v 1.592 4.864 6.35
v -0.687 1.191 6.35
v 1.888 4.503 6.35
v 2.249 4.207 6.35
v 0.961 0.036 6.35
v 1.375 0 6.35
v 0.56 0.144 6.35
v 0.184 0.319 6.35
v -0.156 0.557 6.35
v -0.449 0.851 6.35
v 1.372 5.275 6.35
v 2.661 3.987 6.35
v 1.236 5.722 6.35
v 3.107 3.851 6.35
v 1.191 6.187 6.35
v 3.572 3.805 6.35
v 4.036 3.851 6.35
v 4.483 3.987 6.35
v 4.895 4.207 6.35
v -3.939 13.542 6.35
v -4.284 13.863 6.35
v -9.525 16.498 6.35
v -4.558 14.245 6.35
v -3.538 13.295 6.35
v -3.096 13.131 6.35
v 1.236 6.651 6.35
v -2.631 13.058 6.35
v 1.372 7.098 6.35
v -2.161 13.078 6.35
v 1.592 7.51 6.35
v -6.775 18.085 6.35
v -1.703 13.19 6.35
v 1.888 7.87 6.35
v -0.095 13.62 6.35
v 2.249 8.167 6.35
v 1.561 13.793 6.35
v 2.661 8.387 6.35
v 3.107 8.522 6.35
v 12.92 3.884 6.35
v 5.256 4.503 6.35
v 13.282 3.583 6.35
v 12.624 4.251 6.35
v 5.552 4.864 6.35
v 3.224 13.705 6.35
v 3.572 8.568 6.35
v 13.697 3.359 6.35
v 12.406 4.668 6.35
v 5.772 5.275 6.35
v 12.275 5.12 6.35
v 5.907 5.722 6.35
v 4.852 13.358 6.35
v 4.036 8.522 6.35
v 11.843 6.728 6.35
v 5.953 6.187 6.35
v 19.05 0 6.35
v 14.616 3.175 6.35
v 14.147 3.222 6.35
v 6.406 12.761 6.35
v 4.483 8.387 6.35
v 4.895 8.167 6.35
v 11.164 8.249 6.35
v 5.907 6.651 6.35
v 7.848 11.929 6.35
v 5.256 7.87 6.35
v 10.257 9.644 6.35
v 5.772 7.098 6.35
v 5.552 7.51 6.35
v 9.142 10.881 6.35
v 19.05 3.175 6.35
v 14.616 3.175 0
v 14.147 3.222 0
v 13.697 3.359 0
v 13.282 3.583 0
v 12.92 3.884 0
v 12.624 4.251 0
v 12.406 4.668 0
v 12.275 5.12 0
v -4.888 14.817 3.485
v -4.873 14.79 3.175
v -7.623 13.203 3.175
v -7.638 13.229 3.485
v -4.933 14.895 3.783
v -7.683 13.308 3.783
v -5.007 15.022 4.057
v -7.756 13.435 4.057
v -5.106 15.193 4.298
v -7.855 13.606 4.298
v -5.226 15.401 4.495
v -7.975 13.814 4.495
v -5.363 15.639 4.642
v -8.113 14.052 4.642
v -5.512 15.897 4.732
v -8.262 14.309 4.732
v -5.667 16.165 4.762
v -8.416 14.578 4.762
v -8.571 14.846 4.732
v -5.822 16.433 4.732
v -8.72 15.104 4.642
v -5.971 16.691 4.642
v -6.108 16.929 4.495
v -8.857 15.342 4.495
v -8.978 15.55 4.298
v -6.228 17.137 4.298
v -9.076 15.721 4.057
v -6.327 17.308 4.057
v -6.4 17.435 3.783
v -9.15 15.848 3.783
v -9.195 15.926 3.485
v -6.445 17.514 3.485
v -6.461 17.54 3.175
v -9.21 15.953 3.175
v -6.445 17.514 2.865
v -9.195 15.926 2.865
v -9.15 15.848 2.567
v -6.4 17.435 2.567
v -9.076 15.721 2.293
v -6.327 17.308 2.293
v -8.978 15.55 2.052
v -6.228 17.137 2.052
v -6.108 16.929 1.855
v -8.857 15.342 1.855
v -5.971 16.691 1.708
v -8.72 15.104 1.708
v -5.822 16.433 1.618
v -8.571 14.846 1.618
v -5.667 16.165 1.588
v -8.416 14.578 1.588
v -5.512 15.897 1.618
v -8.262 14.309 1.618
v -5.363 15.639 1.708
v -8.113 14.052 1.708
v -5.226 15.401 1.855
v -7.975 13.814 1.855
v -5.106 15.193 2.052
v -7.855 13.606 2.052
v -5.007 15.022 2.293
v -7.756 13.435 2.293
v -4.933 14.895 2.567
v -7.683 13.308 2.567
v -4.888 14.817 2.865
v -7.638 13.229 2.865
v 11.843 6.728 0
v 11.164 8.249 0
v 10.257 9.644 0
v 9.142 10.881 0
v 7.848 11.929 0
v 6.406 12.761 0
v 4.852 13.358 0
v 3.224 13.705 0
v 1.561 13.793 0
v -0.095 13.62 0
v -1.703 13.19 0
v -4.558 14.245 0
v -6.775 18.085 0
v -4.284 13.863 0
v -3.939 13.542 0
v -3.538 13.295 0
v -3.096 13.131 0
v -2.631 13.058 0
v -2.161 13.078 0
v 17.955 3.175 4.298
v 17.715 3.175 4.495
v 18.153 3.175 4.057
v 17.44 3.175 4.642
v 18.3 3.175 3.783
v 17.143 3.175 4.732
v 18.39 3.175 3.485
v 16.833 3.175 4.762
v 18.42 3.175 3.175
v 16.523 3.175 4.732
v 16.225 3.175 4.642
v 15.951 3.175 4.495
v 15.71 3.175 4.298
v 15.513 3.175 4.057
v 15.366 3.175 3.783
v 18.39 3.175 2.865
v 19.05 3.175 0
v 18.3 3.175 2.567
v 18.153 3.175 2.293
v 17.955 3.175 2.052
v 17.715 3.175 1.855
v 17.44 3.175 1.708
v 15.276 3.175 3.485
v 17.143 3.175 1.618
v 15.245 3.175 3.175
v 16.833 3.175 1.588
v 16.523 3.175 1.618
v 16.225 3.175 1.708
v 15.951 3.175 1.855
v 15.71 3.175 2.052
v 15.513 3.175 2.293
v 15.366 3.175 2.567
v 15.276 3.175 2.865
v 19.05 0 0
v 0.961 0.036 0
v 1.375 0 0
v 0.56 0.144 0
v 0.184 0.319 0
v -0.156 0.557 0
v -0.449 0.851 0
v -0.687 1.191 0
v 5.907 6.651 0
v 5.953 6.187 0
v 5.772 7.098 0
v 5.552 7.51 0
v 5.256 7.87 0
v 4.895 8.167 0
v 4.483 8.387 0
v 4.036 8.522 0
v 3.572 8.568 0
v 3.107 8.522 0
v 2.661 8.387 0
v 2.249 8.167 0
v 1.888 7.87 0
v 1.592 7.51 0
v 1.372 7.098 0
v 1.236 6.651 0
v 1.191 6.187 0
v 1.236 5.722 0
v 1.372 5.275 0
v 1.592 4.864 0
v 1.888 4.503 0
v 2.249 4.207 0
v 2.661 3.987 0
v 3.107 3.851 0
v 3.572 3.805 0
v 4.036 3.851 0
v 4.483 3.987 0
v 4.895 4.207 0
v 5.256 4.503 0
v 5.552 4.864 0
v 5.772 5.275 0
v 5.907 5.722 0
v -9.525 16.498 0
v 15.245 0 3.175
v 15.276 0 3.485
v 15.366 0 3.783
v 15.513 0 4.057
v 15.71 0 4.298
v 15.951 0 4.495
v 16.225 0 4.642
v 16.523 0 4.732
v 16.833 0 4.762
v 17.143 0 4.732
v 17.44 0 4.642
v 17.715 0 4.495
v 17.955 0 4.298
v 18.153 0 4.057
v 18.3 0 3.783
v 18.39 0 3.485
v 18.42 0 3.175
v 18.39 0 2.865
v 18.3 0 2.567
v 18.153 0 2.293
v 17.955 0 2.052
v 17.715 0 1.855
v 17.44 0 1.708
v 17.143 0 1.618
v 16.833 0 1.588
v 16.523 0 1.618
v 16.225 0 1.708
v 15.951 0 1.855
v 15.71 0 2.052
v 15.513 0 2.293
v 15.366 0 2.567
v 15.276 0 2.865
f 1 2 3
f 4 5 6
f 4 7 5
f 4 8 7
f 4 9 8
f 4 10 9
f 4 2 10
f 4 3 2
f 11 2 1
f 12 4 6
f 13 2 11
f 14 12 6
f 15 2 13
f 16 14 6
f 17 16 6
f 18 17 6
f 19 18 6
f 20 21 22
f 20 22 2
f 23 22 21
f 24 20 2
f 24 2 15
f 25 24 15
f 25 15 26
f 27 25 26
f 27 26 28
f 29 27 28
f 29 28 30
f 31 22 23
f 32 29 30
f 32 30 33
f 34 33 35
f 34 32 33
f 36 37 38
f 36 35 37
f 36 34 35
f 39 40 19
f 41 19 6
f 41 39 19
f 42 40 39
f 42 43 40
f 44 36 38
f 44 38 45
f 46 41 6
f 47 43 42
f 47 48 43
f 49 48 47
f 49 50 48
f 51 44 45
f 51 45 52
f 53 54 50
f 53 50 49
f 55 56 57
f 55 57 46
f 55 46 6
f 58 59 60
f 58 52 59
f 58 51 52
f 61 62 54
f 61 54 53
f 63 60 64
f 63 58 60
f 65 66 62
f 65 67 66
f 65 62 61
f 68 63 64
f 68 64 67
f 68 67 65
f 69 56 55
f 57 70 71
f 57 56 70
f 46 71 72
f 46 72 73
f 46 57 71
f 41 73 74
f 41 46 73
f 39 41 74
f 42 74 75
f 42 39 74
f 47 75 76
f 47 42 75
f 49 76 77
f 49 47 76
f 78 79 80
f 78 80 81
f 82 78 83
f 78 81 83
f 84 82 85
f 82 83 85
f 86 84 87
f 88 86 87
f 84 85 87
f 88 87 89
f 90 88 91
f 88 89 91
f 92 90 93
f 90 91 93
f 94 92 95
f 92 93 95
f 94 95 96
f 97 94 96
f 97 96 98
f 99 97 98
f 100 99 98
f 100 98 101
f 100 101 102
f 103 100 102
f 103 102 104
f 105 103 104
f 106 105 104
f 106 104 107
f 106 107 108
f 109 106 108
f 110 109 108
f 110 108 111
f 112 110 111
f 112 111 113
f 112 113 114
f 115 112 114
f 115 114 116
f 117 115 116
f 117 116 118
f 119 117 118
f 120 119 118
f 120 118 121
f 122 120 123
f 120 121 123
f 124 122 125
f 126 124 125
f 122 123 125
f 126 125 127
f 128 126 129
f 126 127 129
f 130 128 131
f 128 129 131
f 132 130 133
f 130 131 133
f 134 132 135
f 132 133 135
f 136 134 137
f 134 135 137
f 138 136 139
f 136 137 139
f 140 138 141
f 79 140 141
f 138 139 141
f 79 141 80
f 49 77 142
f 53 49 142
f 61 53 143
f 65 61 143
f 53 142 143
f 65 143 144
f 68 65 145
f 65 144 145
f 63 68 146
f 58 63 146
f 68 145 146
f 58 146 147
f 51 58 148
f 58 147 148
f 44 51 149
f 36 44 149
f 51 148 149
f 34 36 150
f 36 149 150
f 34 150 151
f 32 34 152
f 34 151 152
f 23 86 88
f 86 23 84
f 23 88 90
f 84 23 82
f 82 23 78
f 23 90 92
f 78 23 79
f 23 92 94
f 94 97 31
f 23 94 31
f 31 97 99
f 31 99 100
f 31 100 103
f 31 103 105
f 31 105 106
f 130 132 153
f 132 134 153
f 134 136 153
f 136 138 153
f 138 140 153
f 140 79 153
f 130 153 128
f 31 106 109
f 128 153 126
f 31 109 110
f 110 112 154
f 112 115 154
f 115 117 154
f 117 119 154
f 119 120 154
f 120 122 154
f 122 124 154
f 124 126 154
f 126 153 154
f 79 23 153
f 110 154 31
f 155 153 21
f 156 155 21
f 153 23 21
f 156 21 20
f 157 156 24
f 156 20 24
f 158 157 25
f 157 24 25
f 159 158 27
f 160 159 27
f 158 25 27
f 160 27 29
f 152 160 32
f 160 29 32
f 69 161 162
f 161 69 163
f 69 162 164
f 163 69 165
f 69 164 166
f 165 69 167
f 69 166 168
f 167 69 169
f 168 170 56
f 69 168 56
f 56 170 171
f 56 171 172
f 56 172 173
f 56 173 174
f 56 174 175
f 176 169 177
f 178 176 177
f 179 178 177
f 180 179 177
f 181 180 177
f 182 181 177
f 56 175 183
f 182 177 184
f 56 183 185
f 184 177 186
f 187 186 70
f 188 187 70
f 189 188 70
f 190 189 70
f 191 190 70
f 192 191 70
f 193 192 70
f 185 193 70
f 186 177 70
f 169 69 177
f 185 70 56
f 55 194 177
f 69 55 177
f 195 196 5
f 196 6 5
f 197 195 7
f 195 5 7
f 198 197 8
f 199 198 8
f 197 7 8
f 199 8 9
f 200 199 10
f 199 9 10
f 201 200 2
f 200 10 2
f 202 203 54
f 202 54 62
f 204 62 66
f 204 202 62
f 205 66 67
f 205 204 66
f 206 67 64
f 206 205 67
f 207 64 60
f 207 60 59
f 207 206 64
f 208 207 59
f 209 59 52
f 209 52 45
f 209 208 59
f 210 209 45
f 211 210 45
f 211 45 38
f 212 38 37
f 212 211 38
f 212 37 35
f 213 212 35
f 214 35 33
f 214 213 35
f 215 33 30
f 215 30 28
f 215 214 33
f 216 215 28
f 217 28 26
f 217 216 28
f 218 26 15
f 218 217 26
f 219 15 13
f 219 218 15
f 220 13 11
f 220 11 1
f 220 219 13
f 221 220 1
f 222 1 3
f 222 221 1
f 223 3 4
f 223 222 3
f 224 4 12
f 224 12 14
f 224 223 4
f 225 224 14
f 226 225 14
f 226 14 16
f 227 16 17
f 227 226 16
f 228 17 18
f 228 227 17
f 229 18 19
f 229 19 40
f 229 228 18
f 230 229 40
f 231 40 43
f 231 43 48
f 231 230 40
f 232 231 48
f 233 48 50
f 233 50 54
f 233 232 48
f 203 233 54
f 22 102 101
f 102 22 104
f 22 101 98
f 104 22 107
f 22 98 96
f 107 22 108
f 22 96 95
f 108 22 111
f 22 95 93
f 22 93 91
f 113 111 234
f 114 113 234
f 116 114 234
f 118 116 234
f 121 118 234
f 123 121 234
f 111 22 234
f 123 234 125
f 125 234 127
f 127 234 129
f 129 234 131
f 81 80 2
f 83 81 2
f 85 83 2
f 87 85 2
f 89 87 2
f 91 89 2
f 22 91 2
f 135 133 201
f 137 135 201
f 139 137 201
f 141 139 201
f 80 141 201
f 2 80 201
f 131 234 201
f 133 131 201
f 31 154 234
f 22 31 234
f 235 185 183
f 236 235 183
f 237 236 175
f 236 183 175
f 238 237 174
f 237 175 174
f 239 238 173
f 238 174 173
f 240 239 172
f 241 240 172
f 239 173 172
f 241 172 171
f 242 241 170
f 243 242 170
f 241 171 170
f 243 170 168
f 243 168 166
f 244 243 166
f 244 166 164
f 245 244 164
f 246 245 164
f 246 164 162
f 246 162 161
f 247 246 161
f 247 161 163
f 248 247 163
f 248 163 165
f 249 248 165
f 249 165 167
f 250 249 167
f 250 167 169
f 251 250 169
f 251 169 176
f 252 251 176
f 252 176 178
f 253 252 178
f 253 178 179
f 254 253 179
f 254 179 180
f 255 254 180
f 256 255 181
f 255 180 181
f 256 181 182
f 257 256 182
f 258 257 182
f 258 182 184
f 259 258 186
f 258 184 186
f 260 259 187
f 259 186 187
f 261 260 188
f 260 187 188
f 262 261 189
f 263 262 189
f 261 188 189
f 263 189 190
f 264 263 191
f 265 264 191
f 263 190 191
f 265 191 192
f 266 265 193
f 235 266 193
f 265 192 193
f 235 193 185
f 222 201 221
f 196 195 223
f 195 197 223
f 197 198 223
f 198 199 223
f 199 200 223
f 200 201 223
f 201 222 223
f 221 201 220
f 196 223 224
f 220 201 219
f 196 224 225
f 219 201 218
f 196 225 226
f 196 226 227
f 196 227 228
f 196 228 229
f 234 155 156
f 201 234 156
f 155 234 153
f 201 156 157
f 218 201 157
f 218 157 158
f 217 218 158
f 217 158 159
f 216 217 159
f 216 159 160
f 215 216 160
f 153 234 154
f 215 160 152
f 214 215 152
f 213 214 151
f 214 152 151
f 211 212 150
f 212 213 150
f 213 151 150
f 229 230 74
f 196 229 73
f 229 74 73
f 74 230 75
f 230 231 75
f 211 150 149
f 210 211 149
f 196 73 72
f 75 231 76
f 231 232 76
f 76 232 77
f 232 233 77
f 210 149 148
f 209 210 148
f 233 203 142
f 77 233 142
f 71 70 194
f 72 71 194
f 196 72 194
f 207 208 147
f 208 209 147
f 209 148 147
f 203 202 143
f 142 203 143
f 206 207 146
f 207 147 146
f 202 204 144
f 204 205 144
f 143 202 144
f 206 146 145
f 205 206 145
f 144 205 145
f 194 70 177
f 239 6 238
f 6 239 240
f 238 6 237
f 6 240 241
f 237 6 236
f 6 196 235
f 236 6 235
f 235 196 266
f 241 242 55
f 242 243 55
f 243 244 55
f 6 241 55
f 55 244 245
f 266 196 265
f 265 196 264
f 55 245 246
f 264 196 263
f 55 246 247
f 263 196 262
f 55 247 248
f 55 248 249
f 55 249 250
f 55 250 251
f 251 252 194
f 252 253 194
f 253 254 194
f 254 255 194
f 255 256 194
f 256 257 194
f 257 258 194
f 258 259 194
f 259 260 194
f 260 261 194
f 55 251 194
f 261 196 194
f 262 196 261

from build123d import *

# Parameters (mm, degrees)
SKETCH1_R           = 2.38125
BOSS_EXTRUDE1_DEPTH = 6.35
FILLET1_R           = 2.38125
SKETCH2_R           = 1.5875
CUT_EXTRUDE1_DEPTH  = 26.010828999
CIRPATTERN1_COUNT   = 3


with BuildPart() as part:
    # Sketch1 → Boss-Extrude1 (new body)
    with BuildSketch(Plane.XY):
        with BuildLine():
            Line((0, 0), (19.05, 0))
            Line((19.05, 0), (19.05, 3.175))
            Line((19.05, 3.175), (12.454412895, 3.175))
            ThreePointArc((12.454412895, 3.175), (7.14375, 12.373337957), (-3.477575791, 12.373337957))
            Line((-3.477575791, 12.373337957), (-6.775369343, 18.085283942))
            Line((-6.775369343, 18.085283942), (-9.525, 16.497783942))
            Line((-9.525, 16.497783942), (0, 0))
        make_face()
        with Locations((3.571875, 6.186668978)):
            Circle(SKETCH1_R, mode=Mode.SUBTRACT)
    extrude(amount=BOSS_EXTRUDE1_DEPTH)

    # Fillet1
    fillet1_edges = [part.edges().sort_by_distance(p)[0] for p in [
        (-3.477575791, 12.373337957, 3.175),
        (12.454412895, 3.175, 3.175),
        (0, 0, 3.175),
    ]]
    fillet(fillet1_edges, radius=FILLET1_R)

    # Sketch2 → Cut-Extrude1 (cut, through all)
    with BuildSketch(Plane(origin=(0, 3.175, 0), x_dir=(1, 0, 0), z_dir=(0, 1, 0))):
        with Locations(Location((16.83287803, -3.175, 0), (0, 0, 180))):
            Circle(SKETCH2_R)
    cut_extrude1 = extrude(amount=-CUT_EXTRUDE1_DEPTH, mode=Mode.SUBTRACT)

    # CirPattern1: Cut-Extrude1 ×3 about axis
    cirpattern1_axis = Axis((0, 0, -80.9), (0, 0, 1))
    for i in range(1, CIRPATTERN1_COUNT):
        add(cut_extrude1.rotate(cirpattern1_axis, i * 360 / CIRPATTERN1_COUNT), mode=Mode.SUBTRACT)


solid = part.part
